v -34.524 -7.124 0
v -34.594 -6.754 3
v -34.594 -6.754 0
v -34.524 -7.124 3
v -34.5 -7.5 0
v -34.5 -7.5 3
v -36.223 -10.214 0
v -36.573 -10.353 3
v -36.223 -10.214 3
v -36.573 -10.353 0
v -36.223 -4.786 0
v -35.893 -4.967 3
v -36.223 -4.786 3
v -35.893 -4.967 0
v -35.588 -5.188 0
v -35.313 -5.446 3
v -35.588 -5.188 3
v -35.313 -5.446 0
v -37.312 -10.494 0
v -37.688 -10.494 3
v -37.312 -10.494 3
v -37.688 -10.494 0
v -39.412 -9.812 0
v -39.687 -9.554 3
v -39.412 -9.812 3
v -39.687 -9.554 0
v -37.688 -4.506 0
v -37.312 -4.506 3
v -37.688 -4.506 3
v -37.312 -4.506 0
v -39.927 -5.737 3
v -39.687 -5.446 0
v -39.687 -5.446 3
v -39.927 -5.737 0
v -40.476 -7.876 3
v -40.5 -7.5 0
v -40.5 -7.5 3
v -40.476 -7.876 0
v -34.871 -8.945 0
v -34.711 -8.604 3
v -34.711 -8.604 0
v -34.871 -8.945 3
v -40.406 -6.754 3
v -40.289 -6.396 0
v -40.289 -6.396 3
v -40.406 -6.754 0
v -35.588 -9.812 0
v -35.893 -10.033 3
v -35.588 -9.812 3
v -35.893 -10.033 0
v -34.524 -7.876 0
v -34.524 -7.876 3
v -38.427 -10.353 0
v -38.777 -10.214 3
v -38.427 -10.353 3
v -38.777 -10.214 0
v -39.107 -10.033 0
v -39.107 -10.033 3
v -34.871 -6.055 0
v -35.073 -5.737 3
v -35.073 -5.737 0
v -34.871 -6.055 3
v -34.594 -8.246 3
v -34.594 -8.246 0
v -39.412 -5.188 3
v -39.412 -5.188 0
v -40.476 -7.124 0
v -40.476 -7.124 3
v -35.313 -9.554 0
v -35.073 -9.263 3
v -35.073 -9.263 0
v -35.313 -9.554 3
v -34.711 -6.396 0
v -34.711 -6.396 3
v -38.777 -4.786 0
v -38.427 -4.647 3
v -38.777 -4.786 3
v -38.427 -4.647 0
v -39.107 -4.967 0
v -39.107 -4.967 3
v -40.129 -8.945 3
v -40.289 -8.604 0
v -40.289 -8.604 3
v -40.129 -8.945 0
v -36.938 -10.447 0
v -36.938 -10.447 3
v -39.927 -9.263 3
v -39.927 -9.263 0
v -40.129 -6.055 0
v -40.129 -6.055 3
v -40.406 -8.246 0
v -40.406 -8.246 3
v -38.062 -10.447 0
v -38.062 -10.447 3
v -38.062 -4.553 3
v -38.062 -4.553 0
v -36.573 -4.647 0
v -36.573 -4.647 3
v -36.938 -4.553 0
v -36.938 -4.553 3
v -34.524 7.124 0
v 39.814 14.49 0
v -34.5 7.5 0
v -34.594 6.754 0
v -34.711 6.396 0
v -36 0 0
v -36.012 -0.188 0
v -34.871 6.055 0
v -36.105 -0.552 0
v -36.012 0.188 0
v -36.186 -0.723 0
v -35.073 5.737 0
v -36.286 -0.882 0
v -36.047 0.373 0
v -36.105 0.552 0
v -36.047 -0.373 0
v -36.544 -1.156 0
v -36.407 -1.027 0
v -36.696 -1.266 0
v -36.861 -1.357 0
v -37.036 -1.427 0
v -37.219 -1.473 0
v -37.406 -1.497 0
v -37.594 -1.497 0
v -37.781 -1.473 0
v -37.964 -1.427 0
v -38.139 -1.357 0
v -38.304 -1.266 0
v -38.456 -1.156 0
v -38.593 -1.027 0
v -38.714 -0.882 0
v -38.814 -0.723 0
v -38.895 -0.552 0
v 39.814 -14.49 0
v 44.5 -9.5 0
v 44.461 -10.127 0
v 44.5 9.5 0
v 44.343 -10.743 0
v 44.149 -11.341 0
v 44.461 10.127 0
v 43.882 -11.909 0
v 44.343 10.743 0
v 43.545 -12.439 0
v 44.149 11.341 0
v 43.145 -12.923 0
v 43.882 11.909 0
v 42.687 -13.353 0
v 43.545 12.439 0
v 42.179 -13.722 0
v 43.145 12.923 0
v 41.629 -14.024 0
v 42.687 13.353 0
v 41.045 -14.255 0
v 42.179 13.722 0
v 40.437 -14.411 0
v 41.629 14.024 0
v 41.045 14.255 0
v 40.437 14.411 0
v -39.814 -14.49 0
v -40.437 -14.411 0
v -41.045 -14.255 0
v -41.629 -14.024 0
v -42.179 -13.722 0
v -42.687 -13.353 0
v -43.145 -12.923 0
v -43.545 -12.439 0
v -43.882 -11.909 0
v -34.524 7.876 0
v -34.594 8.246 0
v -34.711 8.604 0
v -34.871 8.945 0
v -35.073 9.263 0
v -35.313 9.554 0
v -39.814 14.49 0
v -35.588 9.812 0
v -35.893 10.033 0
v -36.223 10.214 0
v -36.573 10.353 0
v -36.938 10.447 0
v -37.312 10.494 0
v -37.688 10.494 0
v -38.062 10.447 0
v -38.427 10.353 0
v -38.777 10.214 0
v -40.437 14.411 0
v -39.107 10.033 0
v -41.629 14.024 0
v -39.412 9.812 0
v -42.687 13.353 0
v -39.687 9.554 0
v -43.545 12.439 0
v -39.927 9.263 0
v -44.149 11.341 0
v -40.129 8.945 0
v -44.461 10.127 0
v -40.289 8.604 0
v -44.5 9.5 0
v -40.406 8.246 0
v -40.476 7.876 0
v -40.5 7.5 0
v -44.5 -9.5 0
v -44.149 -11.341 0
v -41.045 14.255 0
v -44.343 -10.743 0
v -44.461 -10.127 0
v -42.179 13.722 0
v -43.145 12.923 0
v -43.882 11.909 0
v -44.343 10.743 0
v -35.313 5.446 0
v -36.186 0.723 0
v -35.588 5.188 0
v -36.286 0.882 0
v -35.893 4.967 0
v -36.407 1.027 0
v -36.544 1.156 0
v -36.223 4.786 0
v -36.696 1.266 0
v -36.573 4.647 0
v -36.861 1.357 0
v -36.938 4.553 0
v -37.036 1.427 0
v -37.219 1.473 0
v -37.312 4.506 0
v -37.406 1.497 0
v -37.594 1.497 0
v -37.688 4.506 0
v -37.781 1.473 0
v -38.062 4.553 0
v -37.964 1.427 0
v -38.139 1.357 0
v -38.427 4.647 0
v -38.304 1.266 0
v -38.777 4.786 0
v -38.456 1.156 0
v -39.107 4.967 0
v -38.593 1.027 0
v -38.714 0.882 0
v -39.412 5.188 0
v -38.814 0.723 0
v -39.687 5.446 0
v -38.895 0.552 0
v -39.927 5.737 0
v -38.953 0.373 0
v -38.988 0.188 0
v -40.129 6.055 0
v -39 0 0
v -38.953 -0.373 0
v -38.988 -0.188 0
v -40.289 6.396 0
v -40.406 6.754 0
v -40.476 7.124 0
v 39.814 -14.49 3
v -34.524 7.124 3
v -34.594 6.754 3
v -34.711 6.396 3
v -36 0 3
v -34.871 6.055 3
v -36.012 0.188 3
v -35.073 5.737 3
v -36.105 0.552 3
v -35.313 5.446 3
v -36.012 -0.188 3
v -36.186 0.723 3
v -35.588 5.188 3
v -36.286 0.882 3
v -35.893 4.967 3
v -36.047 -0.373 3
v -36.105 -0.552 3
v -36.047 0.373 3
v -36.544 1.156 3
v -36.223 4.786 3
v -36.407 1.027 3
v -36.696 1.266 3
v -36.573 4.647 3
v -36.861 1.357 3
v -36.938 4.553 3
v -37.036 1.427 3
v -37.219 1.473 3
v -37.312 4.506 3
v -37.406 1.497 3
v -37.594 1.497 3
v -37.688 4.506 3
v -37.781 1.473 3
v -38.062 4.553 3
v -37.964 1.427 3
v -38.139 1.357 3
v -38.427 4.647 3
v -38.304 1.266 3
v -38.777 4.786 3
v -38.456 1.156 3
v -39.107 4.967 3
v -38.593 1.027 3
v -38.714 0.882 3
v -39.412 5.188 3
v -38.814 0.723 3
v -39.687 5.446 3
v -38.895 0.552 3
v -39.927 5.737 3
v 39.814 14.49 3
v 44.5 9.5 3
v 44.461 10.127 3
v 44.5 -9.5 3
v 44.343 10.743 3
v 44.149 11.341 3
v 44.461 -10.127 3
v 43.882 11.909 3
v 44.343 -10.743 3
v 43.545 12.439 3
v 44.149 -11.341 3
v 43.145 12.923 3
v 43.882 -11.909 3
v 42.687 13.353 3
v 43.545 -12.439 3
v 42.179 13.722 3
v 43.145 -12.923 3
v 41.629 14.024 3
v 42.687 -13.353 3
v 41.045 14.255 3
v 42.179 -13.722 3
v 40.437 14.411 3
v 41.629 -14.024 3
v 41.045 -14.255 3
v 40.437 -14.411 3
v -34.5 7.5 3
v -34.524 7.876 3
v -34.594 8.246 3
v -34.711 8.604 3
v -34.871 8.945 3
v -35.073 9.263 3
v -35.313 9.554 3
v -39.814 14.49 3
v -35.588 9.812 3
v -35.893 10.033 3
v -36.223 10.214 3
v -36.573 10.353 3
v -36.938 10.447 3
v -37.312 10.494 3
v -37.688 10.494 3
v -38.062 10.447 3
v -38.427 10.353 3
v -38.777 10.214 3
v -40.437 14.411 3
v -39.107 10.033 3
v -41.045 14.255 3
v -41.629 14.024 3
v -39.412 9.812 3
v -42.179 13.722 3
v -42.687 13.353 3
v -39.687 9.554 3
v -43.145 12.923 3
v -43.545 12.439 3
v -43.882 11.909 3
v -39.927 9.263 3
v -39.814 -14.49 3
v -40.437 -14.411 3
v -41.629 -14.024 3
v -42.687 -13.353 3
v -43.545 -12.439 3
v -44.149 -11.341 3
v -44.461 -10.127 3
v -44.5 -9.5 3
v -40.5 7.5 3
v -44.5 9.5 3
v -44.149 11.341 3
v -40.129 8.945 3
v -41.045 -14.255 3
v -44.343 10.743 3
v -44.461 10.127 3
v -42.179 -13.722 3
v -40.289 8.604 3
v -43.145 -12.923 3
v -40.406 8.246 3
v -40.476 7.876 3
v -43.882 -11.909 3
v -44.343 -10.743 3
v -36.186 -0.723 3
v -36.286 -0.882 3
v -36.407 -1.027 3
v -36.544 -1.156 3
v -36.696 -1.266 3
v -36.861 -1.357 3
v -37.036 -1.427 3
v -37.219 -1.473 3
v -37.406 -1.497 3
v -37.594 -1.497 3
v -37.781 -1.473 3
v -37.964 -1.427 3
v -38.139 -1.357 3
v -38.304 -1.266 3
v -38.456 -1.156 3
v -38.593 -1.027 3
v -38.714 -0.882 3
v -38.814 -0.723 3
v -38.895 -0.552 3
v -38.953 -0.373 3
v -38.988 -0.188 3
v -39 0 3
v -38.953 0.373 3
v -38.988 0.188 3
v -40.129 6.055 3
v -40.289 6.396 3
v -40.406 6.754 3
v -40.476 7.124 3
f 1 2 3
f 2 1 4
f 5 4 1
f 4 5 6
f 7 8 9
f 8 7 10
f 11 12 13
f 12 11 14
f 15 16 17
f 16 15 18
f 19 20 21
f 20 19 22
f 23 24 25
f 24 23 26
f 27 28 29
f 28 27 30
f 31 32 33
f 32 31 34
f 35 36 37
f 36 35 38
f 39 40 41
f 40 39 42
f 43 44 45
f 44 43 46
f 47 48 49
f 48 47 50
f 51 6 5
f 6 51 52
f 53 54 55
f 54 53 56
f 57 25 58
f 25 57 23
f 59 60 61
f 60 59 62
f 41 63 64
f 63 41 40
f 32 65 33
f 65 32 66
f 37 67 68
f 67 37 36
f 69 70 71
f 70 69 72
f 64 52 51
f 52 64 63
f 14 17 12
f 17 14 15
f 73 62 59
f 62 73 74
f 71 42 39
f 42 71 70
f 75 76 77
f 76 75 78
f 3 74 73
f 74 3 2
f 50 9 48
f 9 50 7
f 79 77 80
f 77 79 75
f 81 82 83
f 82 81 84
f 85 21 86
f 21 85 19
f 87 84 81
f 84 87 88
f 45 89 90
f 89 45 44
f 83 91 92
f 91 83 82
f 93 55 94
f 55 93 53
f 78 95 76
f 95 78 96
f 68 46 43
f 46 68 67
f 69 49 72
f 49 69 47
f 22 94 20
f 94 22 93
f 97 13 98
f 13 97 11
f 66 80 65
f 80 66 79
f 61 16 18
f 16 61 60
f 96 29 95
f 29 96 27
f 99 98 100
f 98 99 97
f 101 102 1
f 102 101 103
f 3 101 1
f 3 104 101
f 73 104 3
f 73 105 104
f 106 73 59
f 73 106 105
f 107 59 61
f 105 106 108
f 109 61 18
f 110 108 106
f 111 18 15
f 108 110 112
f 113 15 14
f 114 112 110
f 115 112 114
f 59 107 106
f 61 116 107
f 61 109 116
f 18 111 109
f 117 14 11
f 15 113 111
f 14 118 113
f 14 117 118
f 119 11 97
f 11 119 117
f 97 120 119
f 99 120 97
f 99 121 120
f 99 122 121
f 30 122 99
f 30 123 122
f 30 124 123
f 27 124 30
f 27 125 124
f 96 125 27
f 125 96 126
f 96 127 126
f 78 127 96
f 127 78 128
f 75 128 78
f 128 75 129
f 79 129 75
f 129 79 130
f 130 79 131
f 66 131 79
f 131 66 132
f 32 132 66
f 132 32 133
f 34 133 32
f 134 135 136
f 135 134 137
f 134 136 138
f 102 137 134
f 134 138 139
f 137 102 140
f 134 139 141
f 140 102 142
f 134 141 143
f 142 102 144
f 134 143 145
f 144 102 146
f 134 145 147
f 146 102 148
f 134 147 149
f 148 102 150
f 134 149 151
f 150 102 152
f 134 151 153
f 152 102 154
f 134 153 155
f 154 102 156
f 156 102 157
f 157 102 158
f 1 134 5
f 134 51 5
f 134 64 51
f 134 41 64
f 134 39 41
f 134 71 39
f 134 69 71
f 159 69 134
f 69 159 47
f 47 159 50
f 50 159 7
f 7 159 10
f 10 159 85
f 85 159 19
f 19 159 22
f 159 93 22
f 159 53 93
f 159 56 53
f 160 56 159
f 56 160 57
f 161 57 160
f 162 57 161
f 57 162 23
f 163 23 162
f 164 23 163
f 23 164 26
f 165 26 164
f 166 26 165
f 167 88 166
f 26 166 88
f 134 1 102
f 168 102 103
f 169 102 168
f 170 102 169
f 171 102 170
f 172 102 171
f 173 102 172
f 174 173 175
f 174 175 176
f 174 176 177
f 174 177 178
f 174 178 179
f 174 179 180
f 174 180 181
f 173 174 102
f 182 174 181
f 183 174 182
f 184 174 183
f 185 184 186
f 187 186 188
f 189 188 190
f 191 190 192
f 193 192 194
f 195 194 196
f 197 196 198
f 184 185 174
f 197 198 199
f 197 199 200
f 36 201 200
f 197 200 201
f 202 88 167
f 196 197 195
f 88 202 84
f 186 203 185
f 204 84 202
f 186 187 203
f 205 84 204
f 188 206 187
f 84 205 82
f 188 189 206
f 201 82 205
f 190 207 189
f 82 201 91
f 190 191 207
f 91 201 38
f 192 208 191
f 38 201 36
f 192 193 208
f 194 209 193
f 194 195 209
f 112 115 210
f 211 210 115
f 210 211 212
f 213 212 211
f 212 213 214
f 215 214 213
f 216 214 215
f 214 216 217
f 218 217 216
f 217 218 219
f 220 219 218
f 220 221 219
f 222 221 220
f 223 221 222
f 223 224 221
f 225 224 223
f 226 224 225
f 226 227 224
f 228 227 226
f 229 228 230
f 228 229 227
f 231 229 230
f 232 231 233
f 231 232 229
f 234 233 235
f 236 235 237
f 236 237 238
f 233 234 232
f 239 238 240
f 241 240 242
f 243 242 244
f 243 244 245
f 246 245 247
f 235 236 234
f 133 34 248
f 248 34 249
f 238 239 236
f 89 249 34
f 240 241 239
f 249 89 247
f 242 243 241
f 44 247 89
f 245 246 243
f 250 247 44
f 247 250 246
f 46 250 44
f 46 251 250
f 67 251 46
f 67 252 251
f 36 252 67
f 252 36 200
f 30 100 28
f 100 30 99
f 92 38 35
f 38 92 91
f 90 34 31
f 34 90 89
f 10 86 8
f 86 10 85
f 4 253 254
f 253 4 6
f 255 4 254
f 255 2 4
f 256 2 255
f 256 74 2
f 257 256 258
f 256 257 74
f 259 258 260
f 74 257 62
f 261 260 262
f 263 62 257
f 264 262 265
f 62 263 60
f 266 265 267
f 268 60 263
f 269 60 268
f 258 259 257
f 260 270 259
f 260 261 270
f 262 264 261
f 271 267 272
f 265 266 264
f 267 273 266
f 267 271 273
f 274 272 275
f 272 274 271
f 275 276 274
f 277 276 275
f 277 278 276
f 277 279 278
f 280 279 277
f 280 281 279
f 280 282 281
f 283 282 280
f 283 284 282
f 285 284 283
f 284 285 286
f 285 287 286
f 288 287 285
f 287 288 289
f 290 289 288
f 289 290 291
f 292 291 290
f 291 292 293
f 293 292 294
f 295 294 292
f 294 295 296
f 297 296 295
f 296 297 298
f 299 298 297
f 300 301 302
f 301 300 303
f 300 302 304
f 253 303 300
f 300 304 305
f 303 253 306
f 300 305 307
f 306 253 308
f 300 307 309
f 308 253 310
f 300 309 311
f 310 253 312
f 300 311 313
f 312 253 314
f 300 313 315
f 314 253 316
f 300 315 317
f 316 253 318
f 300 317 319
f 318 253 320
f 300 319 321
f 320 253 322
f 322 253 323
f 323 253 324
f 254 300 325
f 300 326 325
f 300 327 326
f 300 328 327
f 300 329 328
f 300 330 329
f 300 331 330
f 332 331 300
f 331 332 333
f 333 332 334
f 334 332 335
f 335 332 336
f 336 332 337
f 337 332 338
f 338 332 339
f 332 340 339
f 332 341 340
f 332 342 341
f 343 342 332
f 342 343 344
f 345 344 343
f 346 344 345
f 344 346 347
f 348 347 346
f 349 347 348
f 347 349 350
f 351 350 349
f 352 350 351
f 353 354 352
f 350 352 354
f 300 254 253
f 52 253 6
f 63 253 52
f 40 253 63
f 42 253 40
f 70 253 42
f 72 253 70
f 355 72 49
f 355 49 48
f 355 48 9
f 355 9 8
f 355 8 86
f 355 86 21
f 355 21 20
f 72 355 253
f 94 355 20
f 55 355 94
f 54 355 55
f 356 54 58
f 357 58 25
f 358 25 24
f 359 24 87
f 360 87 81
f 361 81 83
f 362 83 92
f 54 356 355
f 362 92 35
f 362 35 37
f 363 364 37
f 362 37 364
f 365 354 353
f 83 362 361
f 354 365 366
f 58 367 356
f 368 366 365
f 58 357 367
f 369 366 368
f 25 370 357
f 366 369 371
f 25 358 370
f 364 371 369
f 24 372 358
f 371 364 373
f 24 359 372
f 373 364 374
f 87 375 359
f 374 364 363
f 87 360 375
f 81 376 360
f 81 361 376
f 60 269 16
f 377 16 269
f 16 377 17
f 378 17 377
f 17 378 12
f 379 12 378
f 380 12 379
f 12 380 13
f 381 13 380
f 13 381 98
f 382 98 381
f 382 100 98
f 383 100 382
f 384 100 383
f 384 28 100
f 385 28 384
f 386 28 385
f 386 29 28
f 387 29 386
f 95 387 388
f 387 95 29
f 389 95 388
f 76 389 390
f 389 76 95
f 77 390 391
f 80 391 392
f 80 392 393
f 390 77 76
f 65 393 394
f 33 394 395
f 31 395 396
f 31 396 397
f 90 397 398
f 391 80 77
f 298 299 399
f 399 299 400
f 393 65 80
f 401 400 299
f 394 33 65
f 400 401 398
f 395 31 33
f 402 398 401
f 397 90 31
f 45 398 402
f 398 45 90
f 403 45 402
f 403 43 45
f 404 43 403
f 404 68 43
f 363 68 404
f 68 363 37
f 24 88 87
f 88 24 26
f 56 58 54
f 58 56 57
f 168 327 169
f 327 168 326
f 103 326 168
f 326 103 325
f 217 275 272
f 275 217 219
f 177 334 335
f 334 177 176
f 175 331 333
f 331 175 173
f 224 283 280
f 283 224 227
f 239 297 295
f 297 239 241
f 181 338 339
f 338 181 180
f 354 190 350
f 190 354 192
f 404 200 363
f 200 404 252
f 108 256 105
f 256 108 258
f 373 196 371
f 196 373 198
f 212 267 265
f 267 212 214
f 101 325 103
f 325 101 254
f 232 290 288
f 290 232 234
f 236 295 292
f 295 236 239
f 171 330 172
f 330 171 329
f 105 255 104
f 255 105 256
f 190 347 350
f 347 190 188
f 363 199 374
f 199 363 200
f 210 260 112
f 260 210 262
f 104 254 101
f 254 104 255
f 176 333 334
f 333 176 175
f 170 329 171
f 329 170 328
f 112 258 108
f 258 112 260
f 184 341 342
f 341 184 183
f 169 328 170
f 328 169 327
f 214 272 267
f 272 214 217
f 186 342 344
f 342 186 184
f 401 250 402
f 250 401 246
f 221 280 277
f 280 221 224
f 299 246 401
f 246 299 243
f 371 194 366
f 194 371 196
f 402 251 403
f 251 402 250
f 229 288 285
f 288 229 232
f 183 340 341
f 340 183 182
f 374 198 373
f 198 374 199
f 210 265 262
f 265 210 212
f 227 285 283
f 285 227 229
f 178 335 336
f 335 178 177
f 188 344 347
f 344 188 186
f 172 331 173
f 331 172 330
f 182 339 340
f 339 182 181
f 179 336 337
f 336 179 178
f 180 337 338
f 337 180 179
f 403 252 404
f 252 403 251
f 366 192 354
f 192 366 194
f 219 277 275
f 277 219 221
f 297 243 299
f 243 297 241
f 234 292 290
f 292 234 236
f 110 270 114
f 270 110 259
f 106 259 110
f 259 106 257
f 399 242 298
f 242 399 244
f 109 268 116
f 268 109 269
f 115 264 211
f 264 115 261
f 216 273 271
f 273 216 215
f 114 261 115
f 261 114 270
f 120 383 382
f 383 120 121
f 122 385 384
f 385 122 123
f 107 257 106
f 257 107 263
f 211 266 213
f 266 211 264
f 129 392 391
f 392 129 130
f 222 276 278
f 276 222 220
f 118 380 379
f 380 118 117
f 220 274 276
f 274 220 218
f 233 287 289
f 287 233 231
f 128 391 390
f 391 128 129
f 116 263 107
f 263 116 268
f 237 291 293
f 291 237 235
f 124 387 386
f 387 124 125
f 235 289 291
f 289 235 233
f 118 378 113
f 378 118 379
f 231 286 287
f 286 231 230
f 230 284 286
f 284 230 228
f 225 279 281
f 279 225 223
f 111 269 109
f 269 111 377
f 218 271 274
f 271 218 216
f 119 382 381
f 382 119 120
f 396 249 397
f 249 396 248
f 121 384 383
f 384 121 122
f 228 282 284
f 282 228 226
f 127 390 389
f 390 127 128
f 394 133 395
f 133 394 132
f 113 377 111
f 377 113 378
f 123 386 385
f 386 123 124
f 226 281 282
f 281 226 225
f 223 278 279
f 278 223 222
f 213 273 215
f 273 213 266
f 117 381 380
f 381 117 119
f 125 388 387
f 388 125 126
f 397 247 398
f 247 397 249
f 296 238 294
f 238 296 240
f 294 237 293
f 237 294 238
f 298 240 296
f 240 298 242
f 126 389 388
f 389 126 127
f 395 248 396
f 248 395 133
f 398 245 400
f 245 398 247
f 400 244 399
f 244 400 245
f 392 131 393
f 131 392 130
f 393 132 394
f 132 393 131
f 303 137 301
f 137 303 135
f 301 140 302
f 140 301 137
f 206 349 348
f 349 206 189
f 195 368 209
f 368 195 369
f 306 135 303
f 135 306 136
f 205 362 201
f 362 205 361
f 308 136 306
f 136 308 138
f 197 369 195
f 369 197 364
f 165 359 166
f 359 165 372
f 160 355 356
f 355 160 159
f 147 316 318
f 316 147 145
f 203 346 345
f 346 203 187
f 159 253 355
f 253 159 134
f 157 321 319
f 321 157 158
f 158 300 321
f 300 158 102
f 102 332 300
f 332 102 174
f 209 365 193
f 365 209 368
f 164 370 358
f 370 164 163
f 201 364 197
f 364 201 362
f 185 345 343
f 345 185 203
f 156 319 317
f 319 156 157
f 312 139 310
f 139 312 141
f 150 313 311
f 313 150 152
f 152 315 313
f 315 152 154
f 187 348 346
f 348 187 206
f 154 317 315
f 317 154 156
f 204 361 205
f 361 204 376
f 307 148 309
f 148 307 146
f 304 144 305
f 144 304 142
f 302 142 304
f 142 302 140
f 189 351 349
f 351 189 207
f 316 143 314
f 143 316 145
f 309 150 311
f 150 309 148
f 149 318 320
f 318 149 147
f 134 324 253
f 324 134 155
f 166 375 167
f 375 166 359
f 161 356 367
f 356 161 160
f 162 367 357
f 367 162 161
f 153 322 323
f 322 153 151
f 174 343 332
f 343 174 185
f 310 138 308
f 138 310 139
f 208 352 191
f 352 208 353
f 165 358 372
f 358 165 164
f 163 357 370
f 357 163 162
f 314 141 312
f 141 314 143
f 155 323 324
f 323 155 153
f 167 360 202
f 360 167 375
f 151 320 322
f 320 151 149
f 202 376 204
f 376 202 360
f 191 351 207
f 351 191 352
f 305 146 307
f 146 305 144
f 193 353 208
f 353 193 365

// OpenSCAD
$fn = 50;


difference() {
	union() {
		hull() {
			translate(v = [-39.5000000000, 9.5000000000, 0]) {
				cylinder(h = 3, r = 5);
			}
			translate(v = [39.5000000000, 9.5000000000, 0]) {
				cylinder(h = 3, r = 5);
			}
			translate(v = [-39.5000000000, -9.5000000000, 0]) {
				cylinder(h = 3, r = 5);
			}
			translate(v = [39.5000000000, -9.5000000000, 0]) {
				cylinder(h = 3, r = 5);
			}
		}
	}
	union() {
		translate(v = [-37.5000000000, -7.5000000000, 0]) {
			cylinder(h = 3, r = 3.0000000000);
		}
		translate(v = [-37.5000000000, 7.5000000000, 0]) {
			cylinder(h = 3, r = 3.0000000000);
		}
		translate(v = [-37.5000000000, -7.5000000000, 0]) {
			cylinder(h = 3, r = 1.5000000000);
		}
		translate(v = [-37.5000000000, 0.0000000000, 0]) {
			cylinder(h = 3, r = 1.5000000000);
		}
		translate(v = [-37.5000000000, 7.5000000000, 0]) {
			cylinder(h = 3, r = 1.5000000000);
		}
		translate(v = [-37.5000000000, -7.5000000000, 0]) {
			cylinder(h = 3, r = 1.5000000000);
		}
		translate(v = [-37.5000000000, 0.0000000000, 0]) {
			cylinder(h = 3, r = 1.5000000000);
		}
		translate(v = [-37.5000000000, 7.5000000000, 0]) {
			cylinder(h = 3, r = 1.5000000000);
		}
		translate(v = [-37.5000000000, -7.5000000000, 0]) {
			cylinder(h = 3, r = 1.5000000000);
		}
		translate(v = [-37.5000000000, 0.0000000000, 0]) {
			cylinder(h = 3, r = 1.5000000000);
		}
		translate(v = [-37.5000000000, 7.5000000000, 0]) {
			cylinder(h = 3, r = 1.5000000000);
		}
	}
}
